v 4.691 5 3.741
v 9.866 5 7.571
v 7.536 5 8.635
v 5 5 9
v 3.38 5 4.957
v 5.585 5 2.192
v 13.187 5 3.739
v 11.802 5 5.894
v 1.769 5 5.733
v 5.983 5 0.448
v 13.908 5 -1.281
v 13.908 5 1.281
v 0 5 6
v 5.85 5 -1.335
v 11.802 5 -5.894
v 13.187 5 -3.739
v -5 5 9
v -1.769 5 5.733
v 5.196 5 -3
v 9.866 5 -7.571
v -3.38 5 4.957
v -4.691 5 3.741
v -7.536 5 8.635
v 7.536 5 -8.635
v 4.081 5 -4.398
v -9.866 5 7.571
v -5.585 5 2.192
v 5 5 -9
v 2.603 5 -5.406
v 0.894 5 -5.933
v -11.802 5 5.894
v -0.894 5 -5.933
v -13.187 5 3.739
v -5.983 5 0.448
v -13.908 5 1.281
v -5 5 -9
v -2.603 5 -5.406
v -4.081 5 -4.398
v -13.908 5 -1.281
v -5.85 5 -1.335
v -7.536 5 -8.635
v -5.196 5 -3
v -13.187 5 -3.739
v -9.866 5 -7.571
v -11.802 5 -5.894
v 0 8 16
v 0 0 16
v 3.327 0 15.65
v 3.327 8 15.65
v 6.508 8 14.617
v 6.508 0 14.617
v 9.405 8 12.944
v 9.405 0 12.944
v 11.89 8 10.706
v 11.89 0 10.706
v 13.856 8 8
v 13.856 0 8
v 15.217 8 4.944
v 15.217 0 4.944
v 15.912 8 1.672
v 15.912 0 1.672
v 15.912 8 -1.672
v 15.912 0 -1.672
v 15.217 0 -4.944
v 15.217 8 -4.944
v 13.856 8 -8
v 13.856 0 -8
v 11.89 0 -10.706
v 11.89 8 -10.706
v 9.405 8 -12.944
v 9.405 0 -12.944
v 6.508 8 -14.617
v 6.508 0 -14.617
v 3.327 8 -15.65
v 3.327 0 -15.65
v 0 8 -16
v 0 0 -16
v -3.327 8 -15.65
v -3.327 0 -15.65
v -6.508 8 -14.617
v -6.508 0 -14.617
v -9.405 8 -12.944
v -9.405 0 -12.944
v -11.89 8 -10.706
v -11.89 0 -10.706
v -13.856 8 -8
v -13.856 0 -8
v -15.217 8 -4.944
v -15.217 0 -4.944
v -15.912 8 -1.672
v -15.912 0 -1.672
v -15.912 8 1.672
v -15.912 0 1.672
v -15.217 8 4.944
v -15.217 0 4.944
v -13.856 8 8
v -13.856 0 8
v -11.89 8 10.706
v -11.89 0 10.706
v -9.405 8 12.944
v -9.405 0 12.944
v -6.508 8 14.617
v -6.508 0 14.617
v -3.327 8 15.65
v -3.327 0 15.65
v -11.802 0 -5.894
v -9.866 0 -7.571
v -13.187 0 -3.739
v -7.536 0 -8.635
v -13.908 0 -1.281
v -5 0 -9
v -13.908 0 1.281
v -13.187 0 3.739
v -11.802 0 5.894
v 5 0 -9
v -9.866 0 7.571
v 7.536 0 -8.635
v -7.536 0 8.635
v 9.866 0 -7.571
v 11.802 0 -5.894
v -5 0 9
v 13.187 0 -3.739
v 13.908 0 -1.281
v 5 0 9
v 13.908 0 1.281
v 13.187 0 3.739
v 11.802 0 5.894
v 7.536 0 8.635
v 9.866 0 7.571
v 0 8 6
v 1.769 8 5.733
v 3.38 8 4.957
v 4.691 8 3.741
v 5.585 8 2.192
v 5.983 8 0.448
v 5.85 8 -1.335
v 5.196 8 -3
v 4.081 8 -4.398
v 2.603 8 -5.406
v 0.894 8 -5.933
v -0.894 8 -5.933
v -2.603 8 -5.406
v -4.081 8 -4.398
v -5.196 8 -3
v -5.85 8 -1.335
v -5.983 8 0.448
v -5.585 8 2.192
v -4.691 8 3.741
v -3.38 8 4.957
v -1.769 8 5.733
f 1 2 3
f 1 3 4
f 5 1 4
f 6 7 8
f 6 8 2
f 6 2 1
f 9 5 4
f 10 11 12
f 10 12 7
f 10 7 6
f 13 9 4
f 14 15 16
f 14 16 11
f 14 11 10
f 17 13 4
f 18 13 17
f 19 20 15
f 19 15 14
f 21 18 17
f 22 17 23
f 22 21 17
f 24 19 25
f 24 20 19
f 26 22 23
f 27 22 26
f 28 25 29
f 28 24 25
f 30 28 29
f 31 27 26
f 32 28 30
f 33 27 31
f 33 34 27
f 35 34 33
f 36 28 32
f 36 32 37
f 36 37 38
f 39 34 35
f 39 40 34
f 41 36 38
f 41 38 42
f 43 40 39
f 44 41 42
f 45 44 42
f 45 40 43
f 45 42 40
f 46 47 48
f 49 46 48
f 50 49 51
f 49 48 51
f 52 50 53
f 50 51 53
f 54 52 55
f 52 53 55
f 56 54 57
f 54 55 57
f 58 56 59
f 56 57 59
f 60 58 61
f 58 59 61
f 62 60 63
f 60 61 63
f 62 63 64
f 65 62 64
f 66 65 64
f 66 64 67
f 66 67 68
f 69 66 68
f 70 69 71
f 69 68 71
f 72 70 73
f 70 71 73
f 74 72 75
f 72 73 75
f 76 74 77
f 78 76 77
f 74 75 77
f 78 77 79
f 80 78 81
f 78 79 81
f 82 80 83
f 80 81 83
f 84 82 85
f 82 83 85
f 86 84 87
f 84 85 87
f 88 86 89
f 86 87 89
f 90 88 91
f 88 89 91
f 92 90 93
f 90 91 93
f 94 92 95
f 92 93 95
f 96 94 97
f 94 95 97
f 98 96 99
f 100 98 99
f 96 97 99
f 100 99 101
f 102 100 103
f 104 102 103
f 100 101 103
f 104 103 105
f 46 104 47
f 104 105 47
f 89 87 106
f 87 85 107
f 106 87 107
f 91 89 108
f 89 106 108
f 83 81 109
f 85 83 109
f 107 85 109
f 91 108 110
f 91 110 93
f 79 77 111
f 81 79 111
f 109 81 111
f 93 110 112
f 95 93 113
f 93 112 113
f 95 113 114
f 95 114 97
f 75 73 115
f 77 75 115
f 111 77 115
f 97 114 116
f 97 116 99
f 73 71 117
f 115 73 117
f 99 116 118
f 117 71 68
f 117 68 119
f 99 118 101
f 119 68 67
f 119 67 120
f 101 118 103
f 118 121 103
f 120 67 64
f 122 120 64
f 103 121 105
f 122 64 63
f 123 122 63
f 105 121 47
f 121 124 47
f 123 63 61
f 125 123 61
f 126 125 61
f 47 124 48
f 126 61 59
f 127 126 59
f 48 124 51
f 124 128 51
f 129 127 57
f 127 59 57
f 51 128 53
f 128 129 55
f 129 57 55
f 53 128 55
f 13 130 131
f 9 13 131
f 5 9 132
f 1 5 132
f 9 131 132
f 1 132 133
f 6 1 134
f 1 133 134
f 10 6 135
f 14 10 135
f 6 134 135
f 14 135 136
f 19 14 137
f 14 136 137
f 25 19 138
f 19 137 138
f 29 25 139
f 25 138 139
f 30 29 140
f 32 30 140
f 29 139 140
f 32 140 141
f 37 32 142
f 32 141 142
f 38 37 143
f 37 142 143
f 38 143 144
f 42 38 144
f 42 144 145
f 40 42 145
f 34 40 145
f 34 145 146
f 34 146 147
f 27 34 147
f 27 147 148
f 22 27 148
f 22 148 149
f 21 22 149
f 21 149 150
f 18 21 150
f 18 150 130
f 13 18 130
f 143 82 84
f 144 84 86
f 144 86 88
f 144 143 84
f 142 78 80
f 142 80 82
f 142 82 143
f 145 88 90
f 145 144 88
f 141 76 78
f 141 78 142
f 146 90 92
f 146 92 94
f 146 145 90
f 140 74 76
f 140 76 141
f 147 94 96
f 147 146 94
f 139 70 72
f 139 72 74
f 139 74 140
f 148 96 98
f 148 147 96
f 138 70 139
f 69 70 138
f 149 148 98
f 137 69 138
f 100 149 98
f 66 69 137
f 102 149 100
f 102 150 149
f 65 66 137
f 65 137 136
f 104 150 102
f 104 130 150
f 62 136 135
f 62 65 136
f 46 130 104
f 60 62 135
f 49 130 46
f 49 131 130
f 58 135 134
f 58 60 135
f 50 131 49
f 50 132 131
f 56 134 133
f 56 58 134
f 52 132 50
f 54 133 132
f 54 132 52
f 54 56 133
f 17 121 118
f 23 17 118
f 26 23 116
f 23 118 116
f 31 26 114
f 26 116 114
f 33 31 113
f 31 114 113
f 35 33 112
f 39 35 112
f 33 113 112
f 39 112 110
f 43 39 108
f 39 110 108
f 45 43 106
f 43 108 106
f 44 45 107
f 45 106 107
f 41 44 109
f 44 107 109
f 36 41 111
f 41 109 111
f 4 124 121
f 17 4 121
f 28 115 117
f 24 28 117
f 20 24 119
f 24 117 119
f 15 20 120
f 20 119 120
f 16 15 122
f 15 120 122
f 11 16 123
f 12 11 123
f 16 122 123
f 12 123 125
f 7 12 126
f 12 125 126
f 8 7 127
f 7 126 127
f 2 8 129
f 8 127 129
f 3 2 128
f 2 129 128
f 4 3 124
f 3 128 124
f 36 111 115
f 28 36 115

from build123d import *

# Parameters (mm, degrees)
ESQUISSE2_R             = 16
BOSS_EXTRU_1_DEPTH      = 8
ENL_V_MAT_EXTRU_1_DEPTH = 5
ESQUISSE3_R             = 6
ENL_V_MAT_EXTRU_2_DEPTH = 25


with BuildPart() as part:
    # Esquisse2 → Boss.-Extru.1 (new body)
    with BuildSketch(Plane(origin=(0, 0, 0), x_dir=(1, 0, 0), z_dir=(0, 1, 0))):
        with Locations(Location((0, 0, 0), (0, 0, 270))):
            Circle(ESQUISSE2_R)
    extrude(amount=BOSS_EXTRU_1_DEPTH)

    # Esquisse1 → Enlèv. mat.-Extru.1 (cut)
    with BuildSketch(Plane(origin=(0, 0, 0), x_dir=(1, 0, 0), z_dir=(0, 1, 0))):
        with BuildLine():
            Line((-5, 9), (5, 9))
            ThreePointArc((5, 9), (14, 0), (5, -9))
            Line((5, -9), (-5, -9))
            ThreePointArc((-5, -9), (-14, 0), (-5, 9))
        make_face()
    extrude(amount=ENL_V_MAT_EXTRU_1_DEPTH, mode=Mode.SUBTRACT)

    # Esquisse3 → Enlèv. mat.-Extru.2 (cut, through all)
    with BuildSketch(Plane(origin=(0, 8, 0), x_dir=(1, 0, 0), z_dir=(0, 1, 0))):
        with Locations(Location((0, 0, 0), (0, 0, 270))):
            Circle(ESQUISSE3_R)
    extrude(amount=-ENL_V_MAT_EXTRU_2_DEPTH, mode=Mode.SUBTRACT)


solid = part.part
